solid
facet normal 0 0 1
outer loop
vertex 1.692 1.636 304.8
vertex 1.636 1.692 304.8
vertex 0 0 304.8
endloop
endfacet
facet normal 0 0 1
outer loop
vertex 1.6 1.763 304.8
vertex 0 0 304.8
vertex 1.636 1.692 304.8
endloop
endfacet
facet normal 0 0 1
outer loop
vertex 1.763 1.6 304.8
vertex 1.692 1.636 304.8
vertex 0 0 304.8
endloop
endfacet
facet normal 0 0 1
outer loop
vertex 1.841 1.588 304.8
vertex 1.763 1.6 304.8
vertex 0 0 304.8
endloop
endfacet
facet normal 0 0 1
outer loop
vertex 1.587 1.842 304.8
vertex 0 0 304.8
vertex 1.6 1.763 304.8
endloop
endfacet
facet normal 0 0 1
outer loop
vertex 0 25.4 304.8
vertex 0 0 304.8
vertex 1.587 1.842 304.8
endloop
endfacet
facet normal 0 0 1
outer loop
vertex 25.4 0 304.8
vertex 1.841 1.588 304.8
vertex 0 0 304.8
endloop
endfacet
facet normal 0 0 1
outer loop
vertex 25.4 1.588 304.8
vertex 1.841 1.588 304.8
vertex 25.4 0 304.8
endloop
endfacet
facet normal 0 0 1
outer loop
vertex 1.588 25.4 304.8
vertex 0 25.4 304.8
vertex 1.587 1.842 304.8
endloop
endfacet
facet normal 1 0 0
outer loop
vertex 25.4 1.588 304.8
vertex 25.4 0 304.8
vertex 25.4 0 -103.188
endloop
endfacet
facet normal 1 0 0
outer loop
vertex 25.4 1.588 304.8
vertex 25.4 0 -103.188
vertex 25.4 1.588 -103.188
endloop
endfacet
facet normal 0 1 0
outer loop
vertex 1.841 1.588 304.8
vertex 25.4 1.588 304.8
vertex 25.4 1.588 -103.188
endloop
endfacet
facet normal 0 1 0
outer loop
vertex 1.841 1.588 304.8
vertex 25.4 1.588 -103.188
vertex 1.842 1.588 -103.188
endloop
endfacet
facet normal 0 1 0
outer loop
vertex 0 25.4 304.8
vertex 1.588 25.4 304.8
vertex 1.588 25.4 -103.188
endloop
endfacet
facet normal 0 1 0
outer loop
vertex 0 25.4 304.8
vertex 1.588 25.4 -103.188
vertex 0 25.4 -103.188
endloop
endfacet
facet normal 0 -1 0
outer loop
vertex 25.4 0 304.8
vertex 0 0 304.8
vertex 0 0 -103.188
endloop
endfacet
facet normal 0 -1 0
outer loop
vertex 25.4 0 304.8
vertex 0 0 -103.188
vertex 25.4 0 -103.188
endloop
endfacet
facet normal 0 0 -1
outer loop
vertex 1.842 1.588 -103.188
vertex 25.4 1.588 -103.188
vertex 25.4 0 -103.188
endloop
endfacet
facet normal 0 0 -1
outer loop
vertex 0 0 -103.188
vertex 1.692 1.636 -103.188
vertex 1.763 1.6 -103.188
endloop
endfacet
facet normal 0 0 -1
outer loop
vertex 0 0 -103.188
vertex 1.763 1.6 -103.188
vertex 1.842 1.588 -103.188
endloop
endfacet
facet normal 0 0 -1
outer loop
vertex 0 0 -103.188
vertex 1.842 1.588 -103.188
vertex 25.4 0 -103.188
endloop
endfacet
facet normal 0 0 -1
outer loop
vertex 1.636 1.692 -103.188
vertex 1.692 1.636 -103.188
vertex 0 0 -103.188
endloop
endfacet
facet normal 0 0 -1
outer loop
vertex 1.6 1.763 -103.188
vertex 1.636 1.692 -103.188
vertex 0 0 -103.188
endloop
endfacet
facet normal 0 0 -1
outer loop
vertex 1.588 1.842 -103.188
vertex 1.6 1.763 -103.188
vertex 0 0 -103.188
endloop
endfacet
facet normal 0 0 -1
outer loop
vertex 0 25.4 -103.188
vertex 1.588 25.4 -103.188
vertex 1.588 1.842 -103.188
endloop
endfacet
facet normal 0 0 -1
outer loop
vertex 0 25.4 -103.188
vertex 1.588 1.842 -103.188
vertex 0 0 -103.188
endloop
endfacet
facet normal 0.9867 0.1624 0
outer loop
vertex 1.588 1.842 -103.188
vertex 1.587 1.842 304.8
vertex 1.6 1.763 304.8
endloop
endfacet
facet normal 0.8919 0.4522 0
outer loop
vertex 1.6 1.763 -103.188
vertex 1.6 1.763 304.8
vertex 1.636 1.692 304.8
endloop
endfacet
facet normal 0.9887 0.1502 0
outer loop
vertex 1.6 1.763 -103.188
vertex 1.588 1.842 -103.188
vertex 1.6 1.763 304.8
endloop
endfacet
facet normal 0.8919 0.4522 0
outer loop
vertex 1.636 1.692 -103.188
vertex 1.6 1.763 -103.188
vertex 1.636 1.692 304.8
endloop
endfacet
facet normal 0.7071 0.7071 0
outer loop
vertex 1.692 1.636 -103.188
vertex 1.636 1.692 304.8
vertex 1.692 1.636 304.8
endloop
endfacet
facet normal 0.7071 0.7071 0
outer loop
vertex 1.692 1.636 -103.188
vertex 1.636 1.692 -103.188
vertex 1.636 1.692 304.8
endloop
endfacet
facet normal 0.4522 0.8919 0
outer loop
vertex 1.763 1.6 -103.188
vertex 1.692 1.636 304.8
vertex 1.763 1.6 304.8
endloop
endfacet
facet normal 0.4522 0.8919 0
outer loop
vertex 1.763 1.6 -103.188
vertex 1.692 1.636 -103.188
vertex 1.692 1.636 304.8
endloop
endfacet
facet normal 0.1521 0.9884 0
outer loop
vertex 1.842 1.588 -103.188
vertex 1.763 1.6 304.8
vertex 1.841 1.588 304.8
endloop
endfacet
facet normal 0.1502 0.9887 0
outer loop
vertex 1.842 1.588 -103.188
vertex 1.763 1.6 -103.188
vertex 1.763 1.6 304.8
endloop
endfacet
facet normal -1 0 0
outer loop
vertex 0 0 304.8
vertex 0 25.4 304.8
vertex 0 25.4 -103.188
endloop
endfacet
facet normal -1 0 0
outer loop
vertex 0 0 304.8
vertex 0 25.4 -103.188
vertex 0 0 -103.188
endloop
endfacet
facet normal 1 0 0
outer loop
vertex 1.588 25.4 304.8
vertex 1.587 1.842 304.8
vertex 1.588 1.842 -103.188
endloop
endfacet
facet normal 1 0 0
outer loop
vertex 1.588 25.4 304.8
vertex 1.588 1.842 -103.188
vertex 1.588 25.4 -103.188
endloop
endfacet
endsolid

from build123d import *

# Parameters (mm, degrees)
BOSS_EXTRUDE1_DEPTH = 304.8
FILLET1_R           = 0.254
CUT_EXTRUDE1_DEPTH  = 201.6125


with BuildPart() as part:
    # Sketch3 → Boss-Extrude1 (new, symmetric)
    with BuildSketch(Plane.XY):
        Polygon((1.5875, 25.4), (0, 25.4), (0, 0), (25.4, 0), (25.4, 1.5875), (1.5875, 1.5875), align=None)
    extrude(amount=BOSS_EXTRUDE1_DEPTH, both=True)

    # Fillet1
    fillet1_edges = [part.edges().sort_by_distance(p)[0] for p in [
        (1.5875, 1.5875, 0),
    ]]
    fillet(fillet1_edges, radius=FILLET1_R)

    # Sketch4 → Cut-Extrude1 (cut)
    with BuildSketch(Plane(origin=(0, 0, -304.8), x_dir=(-1, 0, 0), z_dir=(0, 0, -1))):
        with BuildLine():
            Line((-1.5875, 25.4), (-1.5875, 1.8415))
            ThreePointArc((-1.5875, 1.8415), (-1.661894878, 1.661894878), (-1.8415, 1.5875))
            Line((-1.8415, 1.5875), (-25.4, 1.5875))
            Line((-25.4, 1.5875), (-25.4, 0))
            Line((-25.4, 0), (0, 0))
            Line((0, 0), (0, 25.4))
            Line((0, 25.4), (-1.5875, 25.4))
        make_face()
    extrude(amount=-CUT_EXTRUDE1_DEPTH, mode=Mode.SUBTRACT)


solid = part.part
